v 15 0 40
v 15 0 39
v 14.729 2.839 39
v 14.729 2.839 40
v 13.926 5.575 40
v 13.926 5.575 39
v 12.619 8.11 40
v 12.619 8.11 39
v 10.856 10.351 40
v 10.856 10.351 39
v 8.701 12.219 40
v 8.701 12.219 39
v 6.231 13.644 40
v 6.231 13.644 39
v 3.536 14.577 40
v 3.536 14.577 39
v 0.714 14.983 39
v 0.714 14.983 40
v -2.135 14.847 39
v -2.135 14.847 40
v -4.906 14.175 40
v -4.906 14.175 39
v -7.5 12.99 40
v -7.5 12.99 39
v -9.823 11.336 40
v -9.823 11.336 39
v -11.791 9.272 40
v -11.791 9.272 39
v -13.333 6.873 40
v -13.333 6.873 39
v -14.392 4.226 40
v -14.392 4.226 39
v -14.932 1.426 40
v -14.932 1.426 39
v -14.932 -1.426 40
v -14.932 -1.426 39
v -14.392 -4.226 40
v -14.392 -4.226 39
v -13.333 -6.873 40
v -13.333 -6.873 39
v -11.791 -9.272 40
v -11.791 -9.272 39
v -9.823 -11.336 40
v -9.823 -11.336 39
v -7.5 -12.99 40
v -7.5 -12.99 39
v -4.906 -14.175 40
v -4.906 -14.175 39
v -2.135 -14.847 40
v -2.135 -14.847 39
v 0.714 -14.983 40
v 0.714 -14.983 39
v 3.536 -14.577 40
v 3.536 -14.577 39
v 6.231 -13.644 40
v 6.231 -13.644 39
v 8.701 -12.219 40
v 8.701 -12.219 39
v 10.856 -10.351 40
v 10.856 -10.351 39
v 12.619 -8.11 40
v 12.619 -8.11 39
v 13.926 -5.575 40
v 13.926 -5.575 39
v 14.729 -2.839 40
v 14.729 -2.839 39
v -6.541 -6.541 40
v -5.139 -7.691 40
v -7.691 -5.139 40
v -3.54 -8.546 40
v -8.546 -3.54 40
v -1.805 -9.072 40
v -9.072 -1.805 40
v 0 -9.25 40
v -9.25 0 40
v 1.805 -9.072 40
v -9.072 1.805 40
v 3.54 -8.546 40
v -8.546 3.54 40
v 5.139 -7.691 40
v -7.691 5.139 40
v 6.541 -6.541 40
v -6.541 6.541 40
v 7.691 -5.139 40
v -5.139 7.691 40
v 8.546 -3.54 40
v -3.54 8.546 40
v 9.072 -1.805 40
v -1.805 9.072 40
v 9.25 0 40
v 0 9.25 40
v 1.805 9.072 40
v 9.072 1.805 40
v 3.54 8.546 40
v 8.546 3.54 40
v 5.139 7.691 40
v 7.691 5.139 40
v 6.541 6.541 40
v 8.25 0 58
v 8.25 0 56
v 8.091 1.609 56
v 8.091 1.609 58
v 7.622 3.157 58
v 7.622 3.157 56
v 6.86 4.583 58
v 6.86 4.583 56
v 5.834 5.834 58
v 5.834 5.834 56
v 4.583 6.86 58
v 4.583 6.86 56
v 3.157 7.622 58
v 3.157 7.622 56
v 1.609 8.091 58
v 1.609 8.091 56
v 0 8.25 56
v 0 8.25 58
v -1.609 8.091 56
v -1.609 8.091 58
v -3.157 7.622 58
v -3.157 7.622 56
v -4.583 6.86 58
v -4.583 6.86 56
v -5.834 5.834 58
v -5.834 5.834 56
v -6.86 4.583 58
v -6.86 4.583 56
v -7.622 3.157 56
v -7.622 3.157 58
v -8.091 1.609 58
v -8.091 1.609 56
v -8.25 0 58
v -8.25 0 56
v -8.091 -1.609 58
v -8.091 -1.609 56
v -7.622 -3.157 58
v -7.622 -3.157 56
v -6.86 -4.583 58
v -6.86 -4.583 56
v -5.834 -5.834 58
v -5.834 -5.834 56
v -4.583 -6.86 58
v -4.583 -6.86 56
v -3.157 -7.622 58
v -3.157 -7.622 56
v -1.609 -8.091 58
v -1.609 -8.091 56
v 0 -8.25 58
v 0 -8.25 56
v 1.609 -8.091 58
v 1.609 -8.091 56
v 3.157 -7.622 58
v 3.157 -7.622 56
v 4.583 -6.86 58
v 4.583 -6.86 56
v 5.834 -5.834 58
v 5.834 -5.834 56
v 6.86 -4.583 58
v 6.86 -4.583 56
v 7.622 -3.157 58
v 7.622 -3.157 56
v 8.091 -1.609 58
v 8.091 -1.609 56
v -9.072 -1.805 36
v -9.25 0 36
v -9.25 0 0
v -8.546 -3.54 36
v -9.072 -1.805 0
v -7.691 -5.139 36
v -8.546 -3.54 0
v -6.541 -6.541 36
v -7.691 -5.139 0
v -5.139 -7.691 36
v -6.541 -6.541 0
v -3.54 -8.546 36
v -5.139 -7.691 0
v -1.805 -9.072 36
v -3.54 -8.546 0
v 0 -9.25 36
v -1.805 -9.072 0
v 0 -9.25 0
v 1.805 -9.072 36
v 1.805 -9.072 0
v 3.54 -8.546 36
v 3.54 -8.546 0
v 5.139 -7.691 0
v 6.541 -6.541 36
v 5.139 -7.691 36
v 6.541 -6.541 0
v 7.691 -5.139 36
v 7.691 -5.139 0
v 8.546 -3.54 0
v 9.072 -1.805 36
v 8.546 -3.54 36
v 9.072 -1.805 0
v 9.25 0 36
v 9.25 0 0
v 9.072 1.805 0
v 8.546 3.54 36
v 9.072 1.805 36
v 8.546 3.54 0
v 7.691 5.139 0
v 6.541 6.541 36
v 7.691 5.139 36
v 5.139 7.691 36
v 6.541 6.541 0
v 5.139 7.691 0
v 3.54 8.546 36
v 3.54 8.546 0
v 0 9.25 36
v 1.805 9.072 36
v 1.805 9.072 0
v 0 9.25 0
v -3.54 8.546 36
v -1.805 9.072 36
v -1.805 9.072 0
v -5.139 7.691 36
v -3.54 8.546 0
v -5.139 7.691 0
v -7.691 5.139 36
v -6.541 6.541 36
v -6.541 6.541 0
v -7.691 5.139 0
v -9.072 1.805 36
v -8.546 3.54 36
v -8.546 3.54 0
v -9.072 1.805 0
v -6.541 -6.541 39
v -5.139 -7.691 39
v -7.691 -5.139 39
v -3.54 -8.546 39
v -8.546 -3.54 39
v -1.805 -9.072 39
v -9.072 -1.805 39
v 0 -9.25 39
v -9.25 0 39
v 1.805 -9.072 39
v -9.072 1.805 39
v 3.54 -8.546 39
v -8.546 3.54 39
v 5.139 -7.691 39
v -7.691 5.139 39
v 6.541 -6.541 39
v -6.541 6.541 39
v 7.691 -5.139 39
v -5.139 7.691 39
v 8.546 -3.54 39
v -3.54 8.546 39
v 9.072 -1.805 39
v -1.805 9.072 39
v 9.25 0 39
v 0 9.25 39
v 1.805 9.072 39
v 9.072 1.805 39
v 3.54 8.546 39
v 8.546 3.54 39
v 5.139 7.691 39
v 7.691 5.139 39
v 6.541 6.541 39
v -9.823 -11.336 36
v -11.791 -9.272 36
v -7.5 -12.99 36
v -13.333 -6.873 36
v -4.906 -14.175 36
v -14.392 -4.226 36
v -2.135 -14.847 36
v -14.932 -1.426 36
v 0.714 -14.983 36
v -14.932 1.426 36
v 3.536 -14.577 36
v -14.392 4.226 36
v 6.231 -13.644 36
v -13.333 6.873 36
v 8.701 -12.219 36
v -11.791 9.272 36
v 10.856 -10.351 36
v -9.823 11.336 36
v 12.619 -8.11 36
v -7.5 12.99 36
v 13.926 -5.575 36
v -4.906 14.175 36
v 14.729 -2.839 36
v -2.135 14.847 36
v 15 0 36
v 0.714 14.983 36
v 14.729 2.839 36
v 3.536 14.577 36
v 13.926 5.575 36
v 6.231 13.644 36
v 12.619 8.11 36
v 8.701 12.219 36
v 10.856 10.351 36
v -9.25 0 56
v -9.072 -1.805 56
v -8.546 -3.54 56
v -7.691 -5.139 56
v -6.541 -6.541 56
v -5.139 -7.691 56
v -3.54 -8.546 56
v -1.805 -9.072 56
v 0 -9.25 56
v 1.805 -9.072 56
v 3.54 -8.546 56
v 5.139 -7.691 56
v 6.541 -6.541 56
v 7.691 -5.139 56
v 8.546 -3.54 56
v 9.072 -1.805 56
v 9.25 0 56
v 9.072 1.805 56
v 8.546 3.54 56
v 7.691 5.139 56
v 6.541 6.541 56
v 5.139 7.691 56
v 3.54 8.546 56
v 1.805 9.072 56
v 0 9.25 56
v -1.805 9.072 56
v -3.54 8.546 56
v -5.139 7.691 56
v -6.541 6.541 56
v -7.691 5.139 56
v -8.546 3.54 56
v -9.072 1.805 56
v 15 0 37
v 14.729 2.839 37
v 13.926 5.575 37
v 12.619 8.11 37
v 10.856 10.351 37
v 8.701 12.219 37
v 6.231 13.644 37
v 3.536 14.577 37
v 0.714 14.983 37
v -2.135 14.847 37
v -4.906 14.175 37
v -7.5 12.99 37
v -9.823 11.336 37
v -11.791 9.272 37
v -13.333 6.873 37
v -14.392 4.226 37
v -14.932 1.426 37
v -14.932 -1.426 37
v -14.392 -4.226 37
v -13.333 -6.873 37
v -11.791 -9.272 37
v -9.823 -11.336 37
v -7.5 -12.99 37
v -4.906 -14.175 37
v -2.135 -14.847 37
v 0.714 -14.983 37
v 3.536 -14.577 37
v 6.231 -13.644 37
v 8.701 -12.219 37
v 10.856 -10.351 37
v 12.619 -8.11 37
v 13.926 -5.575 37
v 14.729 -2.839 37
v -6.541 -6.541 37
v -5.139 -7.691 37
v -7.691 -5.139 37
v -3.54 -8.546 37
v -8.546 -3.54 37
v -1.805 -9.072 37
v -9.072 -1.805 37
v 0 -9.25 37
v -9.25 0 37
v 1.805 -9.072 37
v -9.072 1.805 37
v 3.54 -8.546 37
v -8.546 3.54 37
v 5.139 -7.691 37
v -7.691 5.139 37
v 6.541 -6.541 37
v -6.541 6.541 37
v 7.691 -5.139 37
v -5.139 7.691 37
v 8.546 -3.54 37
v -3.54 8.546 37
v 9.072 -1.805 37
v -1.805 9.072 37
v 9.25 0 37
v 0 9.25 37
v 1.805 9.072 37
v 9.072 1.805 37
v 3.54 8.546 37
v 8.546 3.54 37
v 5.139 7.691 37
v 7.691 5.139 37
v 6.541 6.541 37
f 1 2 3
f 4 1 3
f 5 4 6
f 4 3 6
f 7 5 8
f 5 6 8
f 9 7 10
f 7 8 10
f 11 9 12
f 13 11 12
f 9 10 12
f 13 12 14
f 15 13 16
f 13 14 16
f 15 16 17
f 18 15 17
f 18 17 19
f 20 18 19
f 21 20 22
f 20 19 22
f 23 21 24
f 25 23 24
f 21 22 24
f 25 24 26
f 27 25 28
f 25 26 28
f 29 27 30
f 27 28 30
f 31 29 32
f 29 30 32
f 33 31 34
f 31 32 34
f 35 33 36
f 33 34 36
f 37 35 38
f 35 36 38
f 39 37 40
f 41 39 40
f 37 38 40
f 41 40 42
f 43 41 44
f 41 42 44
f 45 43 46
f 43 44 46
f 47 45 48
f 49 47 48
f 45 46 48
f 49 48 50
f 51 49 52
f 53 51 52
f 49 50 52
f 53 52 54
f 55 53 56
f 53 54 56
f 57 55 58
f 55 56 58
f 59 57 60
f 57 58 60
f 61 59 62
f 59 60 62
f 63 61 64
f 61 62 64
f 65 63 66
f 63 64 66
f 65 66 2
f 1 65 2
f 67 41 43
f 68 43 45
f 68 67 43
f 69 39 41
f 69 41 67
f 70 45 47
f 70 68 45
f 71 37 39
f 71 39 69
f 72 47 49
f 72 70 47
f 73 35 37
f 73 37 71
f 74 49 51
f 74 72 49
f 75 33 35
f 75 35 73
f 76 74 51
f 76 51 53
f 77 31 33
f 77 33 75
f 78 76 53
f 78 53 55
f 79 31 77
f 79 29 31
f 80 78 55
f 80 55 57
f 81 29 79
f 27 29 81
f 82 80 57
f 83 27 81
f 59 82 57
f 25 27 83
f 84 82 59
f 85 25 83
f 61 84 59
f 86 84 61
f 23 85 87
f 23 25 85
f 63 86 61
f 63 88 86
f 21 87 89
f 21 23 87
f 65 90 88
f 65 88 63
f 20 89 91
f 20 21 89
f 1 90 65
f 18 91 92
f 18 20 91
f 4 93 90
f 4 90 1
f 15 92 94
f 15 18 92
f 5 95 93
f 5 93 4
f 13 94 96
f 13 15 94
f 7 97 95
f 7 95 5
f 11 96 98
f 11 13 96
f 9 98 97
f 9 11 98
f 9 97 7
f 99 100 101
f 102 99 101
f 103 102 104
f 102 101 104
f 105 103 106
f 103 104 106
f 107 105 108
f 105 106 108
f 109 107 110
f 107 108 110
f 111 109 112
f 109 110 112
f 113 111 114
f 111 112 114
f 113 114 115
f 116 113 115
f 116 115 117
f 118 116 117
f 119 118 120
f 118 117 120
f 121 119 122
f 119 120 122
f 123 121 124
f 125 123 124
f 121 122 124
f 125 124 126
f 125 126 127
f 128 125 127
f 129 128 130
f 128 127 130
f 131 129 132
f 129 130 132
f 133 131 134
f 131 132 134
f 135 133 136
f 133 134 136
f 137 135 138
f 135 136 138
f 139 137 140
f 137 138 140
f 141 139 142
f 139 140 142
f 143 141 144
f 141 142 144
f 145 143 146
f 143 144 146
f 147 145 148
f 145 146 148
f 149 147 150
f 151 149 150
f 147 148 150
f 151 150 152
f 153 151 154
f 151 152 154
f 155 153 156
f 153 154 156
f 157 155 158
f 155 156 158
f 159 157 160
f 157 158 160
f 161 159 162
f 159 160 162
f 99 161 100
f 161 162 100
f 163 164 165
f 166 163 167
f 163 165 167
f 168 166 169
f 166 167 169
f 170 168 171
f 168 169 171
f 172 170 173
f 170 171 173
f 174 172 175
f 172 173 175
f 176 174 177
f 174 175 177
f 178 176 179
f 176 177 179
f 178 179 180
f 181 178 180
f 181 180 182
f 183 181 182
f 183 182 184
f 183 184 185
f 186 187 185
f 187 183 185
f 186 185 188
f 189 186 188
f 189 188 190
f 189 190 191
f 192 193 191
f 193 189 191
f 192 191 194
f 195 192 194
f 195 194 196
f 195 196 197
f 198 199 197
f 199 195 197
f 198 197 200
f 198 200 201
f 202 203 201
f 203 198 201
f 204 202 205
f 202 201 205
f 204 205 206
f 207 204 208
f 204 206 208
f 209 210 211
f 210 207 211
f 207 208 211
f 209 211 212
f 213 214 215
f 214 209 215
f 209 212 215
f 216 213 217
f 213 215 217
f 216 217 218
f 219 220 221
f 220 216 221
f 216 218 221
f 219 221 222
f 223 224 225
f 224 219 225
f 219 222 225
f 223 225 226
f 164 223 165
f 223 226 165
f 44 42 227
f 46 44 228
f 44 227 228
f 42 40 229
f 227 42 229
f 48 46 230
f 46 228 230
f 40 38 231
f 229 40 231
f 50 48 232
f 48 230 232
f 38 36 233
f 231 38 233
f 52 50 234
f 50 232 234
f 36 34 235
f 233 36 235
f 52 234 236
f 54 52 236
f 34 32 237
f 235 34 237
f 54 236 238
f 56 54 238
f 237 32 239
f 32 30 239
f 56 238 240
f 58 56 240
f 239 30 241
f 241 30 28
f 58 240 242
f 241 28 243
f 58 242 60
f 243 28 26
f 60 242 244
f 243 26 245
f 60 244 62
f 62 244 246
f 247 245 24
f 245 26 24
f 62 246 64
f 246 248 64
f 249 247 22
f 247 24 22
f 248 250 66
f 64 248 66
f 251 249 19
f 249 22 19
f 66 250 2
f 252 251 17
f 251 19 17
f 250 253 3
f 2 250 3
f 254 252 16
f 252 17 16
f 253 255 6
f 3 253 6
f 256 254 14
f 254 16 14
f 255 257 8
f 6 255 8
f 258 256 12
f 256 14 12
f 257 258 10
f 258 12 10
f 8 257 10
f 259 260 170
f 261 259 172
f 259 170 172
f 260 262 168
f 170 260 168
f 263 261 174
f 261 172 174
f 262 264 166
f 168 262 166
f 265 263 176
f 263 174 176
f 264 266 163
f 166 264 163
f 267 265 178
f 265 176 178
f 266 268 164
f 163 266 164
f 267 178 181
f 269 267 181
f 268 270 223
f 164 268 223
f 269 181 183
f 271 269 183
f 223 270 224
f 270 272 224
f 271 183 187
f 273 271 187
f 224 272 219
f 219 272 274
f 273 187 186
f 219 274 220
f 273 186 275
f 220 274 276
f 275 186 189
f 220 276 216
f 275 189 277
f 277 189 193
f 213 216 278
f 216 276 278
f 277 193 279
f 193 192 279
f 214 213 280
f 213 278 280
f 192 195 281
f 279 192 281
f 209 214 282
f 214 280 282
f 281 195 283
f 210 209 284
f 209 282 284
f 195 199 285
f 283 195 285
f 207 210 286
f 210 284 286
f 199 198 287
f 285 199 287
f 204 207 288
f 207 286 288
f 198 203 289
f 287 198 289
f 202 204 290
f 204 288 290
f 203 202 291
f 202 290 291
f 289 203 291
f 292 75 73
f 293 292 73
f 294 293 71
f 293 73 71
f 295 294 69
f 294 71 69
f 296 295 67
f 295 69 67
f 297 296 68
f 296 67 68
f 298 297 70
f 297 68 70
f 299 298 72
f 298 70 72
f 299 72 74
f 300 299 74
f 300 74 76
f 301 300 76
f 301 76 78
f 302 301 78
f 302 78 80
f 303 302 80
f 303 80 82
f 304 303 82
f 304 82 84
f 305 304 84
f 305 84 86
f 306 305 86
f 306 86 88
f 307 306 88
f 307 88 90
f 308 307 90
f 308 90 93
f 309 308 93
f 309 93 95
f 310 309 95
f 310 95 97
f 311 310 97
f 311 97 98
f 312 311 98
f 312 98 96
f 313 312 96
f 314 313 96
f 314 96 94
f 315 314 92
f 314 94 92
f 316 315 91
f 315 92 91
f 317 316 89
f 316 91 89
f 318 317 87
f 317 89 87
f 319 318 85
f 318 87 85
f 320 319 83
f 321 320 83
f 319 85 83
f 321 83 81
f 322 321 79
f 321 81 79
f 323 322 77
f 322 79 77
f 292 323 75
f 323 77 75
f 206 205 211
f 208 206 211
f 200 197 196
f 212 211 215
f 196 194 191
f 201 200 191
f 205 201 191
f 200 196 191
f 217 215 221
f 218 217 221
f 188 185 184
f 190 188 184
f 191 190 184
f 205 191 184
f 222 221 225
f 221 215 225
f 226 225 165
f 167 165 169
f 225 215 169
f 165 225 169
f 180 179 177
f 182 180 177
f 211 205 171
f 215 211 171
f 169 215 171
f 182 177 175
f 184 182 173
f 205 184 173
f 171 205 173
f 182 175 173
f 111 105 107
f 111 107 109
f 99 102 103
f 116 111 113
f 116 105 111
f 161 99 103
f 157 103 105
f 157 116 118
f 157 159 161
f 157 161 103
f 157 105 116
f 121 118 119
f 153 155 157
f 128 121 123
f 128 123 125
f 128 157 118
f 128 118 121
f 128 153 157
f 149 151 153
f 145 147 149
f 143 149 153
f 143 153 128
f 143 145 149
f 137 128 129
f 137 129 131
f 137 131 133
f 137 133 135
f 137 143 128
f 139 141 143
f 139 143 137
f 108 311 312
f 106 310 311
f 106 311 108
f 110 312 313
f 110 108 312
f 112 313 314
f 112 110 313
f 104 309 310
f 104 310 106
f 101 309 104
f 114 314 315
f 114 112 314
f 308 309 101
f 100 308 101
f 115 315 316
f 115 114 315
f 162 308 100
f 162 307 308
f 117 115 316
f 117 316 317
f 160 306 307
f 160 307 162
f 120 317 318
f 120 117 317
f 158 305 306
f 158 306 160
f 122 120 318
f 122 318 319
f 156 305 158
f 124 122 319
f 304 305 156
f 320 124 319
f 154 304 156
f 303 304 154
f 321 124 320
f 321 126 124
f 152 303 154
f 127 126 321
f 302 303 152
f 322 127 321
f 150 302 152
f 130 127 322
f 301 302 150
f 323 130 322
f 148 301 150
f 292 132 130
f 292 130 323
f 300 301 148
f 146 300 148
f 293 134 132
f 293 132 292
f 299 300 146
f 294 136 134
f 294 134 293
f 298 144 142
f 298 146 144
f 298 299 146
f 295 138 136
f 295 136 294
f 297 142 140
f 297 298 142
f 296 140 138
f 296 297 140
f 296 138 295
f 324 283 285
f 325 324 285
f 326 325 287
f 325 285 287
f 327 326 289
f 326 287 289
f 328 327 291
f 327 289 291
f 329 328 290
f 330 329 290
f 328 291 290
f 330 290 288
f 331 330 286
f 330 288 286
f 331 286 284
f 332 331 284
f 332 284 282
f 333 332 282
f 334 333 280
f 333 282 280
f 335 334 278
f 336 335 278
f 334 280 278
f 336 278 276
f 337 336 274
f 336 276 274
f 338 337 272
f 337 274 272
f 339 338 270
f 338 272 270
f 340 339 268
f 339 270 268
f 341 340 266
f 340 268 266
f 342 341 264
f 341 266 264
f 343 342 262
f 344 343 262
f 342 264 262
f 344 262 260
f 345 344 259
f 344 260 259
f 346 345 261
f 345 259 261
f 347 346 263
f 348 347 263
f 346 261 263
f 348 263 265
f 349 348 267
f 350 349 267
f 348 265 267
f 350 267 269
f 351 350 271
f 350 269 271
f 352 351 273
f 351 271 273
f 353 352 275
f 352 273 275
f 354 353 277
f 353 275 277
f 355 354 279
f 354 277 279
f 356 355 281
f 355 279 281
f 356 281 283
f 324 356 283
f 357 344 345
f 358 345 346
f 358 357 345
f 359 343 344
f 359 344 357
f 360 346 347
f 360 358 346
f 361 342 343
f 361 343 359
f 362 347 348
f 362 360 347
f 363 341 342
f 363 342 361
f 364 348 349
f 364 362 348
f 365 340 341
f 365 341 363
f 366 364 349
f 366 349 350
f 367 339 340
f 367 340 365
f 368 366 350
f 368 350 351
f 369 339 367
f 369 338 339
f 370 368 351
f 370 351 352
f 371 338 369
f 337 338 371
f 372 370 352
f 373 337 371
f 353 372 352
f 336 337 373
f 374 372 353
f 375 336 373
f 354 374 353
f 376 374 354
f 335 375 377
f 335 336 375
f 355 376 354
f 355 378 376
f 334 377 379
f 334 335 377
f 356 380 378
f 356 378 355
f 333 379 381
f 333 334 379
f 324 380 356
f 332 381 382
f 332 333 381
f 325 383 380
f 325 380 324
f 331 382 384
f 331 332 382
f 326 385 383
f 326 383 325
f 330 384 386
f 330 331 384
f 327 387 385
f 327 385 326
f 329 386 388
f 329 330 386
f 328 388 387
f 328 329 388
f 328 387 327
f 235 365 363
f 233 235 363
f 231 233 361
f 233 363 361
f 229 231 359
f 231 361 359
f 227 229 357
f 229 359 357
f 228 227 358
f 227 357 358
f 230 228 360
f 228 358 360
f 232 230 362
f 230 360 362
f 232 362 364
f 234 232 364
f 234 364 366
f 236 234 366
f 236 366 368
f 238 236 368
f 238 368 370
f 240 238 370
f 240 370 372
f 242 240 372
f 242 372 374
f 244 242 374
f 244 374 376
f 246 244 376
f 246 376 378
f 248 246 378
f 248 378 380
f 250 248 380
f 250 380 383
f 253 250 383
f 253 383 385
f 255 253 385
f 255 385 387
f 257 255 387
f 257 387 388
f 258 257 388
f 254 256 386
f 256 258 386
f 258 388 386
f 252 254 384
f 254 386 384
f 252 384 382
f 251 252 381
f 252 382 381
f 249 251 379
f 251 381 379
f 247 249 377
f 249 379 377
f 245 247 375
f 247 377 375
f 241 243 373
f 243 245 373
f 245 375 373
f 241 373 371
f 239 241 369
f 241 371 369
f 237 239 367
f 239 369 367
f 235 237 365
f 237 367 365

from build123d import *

# Parameters (mm, degrees)
SKETCH1_R           = 9.25
BOSS_EXTRUDE1_DEPTH = 58
CUT_EXTRUDE1_START  = -2
SKETCH2_R           = 9.25
SKETCH2_R_2         = 8.25
CUT_EXTRUDE1_DEPTH  = 2
SKETCH3_R           = 15
BOSS_EXTRUDE2_DEPTH = 1
LPATTERN1_COUNT     = 2
LPATTERN1_PITCH     = 3


with BuildPart() as part:
    # Sketch1 → Boss-Extrude1 (new body)
    with BuildSketch(Plane.XY):
        with Locations(Location((0, 0, 0), (0, 0, 180))):
            Circle(SKETCH1_R)
    extrude(amount=BOSS_EXTRUDE1_DEPTH)

    # Sketch2 → Cut-Extrude1 (cut)
    with BuildSketch(Plane.XY.offset(58).offset(CUT_EXTRUDE1_START)):
        with Locations(Location((0, 0, 0), (0, 0, 180))):
            Circle(SKETCH2_R)
        Circle(SKETCH2_R_2, mode=Mode.SUBTRACT)
    extrude(amount=CUT_EXTRUDE1_DEPTH, mode=Mode.SUBTRACT)

    # Sketch3 → Boss-Extrude2 (add)
    with BuildSketch(Plane.XY.offset(36)):
        Circle(SKETCH3_R)
    boss_extrude2 = extrude(amount=BOSS_EXTRUDE2_DEPTH)

    # LPattern1: Boss-Extrude2 ×2
    with Locations(*[(0, 0, i * LPATTERN1_PITCH) for i in range(1, LPATTERN1_COUNT)]):
        add(boss_extrude2)


solid = part.part
